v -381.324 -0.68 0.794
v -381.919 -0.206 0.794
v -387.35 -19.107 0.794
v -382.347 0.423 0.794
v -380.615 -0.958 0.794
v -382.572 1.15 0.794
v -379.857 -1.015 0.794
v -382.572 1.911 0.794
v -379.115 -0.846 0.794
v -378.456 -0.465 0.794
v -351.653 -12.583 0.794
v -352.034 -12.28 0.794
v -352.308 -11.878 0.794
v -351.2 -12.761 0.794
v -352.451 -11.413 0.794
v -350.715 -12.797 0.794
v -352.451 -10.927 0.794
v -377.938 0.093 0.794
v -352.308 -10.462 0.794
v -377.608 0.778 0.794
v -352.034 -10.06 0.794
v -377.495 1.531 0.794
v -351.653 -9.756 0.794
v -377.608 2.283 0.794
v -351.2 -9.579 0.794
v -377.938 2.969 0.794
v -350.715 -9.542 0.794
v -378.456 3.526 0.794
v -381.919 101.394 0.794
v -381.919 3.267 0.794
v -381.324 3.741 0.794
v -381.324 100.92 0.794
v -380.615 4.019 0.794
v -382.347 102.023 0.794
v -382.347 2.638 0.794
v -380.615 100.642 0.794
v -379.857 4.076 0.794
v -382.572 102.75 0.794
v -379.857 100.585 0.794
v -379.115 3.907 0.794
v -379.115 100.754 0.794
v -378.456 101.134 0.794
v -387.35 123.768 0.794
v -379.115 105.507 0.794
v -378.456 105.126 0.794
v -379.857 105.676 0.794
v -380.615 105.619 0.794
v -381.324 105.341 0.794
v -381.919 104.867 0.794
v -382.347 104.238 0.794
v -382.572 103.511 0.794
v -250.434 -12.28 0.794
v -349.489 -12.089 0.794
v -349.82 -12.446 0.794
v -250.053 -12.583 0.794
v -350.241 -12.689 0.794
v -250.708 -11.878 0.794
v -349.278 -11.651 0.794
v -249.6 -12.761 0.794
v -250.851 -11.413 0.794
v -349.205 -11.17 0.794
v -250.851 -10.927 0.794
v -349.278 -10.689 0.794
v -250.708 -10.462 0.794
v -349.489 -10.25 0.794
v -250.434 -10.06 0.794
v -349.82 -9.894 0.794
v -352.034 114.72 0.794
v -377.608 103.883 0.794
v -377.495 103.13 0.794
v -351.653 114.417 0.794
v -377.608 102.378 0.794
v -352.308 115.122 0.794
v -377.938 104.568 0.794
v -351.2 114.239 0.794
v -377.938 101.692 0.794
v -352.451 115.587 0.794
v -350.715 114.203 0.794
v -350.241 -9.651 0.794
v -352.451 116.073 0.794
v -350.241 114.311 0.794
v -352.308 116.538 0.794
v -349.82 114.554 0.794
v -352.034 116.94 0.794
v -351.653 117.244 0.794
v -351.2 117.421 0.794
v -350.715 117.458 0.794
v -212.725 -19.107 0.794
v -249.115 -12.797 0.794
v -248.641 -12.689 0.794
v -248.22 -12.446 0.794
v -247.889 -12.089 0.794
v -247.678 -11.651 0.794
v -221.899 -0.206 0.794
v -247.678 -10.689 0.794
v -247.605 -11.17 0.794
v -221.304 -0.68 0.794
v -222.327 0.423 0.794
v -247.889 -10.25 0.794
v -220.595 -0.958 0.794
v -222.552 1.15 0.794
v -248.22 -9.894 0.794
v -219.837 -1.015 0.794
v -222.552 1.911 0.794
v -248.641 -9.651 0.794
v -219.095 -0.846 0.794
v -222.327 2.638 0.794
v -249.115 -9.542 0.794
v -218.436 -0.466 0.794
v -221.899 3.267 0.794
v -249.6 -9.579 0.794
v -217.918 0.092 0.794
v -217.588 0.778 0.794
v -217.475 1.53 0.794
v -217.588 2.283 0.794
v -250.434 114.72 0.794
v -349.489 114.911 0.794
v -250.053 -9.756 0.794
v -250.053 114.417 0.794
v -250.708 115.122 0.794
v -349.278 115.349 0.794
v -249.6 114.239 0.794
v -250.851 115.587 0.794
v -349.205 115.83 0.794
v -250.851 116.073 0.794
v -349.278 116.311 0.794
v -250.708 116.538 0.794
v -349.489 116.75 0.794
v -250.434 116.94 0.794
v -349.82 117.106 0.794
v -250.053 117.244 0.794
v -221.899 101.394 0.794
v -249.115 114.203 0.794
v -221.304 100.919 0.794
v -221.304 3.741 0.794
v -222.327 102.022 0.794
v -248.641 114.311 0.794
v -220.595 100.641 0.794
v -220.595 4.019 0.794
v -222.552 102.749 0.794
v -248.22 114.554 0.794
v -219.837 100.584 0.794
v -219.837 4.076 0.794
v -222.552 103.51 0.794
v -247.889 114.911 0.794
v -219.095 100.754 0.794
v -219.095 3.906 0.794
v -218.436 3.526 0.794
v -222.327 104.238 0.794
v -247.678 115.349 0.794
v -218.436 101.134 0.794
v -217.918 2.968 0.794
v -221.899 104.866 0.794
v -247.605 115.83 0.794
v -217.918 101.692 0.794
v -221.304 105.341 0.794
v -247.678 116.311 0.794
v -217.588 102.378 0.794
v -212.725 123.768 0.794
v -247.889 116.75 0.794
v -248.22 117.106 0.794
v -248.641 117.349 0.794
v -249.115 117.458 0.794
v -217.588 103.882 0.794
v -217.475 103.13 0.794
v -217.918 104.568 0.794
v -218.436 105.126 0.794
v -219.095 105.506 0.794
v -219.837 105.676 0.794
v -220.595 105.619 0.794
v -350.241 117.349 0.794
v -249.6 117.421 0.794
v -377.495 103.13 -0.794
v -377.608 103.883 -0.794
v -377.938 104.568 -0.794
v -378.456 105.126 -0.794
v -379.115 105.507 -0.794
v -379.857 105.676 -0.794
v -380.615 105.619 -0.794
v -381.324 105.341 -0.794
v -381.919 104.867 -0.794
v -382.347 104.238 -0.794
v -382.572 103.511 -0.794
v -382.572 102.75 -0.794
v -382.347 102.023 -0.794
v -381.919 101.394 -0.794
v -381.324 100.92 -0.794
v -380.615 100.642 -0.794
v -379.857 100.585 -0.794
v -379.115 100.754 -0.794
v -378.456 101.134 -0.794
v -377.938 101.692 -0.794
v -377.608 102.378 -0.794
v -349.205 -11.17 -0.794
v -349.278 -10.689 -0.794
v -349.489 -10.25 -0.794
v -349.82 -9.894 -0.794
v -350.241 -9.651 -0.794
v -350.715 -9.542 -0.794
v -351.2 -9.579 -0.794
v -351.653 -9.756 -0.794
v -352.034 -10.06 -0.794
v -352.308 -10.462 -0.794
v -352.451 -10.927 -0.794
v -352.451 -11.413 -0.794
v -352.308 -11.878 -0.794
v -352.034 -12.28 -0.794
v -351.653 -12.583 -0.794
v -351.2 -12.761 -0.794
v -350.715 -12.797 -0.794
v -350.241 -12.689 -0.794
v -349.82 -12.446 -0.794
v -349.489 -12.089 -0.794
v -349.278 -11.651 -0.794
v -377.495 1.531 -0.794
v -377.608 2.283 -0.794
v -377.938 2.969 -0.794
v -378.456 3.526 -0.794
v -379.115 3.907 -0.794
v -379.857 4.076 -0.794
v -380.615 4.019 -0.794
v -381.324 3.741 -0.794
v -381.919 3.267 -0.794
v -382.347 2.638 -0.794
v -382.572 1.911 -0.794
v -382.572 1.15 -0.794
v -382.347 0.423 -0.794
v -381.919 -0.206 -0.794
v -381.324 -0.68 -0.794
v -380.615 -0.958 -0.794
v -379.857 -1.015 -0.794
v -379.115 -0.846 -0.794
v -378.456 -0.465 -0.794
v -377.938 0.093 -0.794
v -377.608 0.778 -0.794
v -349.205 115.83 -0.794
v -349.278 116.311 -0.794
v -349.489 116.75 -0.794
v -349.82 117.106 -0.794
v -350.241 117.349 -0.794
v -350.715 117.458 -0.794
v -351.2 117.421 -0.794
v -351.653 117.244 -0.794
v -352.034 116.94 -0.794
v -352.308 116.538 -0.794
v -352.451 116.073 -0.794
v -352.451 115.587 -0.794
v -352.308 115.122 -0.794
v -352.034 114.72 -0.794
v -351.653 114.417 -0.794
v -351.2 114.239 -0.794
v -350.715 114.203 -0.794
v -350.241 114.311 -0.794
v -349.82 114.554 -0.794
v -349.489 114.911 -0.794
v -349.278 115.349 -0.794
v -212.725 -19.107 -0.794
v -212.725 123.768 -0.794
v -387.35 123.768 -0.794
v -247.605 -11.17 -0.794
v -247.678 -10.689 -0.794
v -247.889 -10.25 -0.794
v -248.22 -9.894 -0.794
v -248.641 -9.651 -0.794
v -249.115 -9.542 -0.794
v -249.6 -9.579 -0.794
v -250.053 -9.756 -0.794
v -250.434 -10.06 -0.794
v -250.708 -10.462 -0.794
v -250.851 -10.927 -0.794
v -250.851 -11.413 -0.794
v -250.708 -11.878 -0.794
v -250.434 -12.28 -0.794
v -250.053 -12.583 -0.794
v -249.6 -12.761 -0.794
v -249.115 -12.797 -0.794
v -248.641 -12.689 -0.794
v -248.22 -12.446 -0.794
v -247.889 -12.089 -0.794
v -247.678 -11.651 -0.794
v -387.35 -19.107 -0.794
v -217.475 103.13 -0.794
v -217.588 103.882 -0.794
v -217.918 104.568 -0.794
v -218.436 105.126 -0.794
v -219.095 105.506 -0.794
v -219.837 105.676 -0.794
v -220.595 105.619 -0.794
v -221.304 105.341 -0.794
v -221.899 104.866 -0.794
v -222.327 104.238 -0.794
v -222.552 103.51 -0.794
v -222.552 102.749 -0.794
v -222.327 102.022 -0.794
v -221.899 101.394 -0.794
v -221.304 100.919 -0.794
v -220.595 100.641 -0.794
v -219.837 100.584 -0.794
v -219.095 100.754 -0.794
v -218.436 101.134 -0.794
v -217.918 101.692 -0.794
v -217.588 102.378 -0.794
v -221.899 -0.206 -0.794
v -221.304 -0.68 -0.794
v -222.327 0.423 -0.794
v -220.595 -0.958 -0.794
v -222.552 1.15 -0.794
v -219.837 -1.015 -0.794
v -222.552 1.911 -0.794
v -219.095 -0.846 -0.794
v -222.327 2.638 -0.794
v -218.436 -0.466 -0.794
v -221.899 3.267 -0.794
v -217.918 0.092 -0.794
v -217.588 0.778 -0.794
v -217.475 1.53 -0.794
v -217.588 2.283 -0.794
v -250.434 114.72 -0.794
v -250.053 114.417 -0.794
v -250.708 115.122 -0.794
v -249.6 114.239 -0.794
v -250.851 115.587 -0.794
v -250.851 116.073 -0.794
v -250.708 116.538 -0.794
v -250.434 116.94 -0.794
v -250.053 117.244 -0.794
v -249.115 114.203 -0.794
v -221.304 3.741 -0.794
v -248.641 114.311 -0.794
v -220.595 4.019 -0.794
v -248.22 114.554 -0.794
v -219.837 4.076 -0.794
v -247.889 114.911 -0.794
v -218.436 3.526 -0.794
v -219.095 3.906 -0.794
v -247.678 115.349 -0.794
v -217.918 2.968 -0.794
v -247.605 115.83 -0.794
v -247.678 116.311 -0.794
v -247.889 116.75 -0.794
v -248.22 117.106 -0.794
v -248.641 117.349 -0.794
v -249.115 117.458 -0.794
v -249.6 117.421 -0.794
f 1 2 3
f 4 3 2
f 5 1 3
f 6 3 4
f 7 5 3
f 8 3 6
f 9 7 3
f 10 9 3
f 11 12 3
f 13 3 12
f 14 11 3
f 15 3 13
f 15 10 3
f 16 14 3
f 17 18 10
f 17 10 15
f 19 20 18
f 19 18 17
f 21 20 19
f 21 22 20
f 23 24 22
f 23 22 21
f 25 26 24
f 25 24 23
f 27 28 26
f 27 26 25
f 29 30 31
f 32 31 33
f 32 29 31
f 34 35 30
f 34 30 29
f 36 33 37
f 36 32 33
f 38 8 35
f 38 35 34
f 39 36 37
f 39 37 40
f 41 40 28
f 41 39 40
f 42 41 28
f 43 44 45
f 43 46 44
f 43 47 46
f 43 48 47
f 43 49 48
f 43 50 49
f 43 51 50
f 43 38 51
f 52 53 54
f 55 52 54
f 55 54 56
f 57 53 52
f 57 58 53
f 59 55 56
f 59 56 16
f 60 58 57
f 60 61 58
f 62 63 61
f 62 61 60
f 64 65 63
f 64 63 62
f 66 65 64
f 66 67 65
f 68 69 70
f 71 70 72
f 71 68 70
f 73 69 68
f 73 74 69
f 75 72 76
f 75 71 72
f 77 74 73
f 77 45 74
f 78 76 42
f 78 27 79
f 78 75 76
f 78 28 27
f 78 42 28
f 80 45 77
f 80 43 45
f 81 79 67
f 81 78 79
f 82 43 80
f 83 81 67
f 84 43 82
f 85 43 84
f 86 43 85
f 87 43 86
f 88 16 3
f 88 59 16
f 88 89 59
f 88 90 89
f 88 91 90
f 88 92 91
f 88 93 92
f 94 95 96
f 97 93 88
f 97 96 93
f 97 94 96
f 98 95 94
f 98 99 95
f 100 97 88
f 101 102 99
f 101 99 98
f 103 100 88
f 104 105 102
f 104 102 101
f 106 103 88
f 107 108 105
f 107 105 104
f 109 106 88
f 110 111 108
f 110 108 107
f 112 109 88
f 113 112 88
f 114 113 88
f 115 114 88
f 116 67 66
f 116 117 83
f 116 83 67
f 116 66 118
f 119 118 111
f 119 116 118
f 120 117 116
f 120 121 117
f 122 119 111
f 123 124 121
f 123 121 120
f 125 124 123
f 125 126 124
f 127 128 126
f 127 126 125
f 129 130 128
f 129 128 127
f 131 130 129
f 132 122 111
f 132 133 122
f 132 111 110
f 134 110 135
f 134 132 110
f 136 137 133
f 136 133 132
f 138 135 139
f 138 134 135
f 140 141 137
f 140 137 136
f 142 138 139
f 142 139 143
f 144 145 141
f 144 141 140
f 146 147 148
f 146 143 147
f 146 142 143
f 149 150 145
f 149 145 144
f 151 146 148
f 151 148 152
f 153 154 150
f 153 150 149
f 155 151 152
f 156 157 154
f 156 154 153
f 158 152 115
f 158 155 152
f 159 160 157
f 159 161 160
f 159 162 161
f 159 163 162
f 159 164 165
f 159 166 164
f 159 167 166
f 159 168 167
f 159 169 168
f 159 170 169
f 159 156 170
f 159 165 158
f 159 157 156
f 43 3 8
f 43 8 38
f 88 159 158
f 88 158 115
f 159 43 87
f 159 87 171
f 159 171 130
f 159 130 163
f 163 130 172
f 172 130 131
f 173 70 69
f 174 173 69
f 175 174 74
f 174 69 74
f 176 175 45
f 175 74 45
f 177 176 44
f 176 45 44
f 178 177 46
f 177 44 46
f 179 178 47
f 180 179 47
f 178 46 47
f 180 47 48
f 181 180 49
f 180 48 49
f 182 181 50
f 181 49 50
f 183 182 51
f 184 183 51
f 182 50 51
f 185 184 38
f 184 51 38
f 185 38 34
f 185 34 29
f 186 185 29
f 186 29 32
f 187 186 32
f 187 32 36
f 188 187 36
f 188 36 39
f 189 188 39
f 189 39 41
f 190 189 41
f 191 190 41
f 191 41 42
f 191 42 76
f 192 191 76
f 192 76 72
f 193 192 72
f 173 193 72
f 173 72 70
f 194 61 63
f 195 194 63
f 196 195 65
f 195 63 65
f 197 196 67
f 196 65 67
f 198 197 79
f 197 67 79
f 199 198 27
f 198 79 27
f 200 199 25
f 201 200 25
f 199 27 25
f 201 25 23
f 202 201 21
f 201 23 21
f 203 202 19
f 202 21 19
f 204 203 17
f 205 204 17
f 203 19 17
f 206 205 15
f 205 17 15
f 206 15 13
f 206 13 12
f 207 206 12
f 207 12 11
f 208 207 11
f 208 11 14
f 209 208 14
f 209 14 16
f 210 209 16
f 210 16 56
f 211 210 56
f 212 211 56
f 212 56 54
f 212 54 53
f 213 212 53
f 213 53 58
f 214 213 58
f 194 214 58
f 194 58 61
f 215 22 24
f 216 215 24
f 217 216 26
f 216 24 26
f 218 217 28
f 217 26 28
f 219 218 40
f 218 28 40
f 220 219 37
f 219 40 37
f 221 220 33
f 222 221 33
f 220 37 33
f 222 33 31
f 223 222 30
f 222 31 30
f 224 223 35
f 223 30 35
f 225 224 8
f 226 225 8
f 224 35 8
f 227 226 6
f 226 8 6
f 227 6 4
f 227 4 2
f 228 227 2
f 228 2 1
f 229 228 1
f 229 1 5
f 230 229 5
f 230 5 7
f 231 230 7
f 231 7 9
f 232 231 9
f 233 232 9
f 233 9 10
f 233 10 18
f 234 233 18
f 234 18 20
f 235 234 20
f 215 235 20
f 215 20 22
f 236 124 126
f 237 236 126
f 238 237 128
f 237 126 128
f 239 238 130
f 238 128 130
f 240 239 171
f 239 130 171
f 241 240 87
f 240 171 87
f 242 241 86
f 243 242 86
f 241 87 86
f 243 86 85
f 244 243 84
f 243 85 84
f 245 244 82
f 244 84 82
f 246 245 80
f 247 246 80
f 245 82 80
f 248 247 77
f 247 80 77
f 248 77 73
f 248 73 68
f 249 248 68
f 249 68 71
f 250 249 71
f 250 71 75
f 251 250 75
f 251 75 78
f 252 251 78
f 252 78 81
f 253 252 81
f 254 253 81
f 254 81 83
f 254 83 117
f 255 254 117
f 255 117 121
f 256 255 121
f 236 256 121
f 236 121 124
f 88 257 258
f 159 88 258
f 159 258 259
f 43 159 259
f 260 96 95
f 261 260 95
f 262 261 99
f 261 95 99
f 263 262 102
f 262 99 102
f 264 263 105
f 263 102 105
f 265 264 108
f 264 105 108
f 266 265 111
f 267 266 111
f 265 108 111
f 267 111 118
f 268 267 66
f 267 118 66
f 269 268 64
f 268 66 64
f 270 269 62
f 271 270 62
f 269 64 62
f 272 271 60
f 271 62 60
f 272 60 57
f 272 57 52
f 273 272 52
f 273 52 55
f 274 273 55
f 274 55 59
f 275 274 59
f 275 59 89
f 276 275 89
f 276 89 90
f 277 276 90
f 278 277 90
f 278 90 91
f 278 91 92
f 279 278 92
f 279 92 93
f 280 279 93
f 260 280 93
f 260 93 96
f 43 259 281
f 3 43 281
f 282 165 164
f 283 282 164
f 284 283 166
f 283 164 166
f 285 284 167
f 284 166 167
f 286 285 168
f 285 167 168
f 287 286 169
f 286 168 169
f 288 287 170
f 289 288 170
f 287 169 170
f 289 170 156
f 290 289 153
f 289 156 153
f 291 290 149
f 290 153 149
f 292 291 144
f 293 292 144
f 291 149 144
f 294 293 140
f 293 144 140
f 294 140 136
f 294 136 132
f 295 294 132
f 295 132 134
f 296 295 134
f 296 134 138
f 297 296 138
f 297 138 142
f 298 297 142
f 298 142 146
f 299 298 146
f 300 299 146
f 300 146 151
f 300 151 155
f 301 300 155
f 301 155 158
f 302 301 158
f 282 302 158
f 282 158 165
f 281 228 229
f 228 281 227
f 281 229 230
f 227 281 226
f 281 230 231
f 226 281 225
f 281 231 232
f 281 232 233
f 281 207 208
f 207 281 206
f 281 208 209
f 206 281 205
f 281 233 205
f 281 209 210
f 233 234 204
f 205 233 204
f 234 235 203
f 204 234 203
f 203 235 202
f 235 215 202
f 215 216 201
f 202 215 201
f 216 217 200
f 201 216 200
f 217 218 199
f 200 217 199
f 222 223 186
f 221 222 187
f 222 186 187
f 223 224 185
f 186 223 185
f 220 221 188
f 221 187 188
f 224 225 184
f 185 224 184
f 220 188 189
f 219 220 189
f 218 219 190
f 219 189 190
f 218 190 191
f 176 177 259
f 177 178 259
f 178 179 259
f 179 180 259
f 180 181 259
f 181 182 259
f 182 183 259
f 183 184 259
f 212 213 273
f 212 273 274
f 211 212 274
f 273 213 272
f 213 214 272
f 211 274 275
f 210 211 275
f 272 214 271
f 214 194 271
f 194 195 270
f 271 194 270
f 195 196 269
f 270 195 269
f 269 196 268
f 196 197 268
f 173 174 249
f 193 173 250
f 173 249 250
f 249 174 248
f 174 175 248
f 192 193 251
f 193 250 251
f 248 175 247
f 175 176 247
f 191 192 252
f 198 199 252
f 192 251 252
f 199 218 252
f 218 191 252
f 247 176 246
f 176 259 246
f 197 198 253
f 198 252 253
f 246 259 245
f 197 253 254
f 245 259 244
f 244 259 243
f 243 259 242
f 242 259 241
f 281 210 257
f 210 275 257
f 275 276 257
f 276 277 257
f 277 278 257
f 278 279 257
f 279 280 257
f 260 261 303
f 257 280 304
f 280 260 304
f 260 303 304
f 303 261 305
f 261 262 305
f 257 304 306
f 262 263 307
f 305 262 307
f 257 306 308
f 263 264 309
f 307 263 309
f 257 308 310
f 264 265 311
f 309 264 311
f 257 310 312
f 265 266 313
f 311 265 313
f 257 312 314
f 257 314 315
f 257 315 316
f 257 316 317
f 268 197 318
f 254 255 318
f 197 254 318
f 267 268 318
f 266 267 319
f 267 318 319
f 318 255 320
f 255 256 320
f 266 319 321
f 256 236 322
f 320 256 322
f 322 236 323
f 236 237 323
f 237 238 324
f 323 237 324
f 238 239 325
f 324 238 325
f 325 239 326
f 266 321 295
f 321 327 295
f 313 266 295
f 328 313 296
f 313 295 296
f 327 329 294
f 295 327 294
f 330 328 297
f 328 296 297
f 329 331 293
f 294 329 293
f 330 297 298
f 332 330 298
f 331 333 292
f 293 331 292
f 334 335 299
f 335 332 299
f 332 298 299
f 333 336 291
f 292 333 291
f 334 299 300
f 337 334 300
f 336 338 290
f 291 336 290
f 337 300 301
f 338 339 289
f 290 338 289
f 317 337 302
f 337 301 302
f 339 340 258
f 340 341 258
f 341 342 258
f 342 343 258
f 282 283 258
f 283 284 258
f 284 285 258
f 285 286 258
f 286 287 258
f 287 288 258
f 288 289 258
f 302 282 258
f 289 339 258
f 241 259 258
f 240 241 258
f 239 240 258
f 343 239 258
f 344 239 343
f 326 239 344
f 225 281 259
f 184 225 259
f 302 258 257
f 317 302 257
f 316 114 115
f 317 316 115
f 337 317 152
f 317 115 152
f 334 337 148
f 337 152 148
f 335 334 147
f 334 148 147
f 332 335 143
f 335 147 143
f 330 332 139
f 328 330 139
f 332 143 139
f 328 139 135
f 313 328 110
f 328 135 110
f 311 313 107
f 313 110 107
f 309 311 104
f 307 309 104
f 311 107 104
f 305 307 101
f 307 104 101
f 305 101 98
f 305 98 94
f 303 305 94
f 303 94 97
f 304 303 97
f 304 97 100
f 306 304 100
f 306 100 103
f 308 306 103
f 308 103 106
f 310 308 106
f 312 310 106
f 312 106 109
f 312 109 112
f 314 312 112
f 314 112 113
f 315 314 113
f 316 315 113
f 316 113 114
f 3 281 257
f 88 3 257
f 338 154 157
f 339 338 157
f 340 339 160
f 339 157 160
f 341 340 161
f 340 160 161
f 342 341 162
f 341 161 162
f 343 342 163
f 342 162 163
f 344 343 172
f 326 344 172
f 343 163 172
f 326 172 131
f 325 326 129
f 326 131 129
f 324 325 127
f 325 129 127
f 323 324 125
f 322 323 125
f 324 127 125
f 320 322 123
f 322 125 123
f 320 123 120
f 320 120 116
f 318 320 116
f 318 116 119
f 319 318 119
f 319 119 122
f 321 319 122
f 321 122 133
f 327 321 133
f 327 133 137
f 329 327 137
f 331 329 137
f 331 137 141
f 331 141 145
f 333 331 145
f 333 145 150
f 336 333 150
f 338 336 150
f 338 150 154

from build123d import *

# Parameters (mm, degrees)
SKETCH3_W              = 914.4
SKETCH3_H              = 609.6
BOSS_EXTRUDE1_DEPTH    = 0.79375
SKETCH4_OUTSIDE_W      = 1136.194
SKETCH4_OUTSIDE_H      = 831.394
CUT_EXTRUDE1_DEPTH     = 2.54
F_4_CLEARANCE_HOLE1_D  = 3.2639
F_10_CLEARANCE_HOLE1_D = 5.1054


with BuildPart() as part:
    # Sketch3 → Boss-Extrude1 (new, symmetric)
    with BuildSketch(Plane.XY):
        Rectangle(SKETCH3_W, SKETCH3_H)
    extrude(amount=BOSS_EXTRUDE1_DEPTH, both=True)

    # Sketch4 outside → Cut-Extrude1 (cut)
    with BuildSketch(Plane(origin=(0, 0, -0.79375), x_dir=(-1, 0, 0), z_dir=(0, 0, -1))):
        Rectangle(SKETCH4_OUTSIDE_W, SKETCH4_OUTSIDE_H)
        Polygon((387.349825772, -19.107241188), (212.724825222, -19.107241187), (212.724825222, 123.767758813), (387.349825755, 123.767758812), align=None, mode=Mode.SUBTRACT)
    extrude(amount=-CUT_EXTRUDE1_DEPTH, mode=Mode.SUBTRACT)

    # #4 Clearance Hole1 (through all)
    with Locations(Plane(origin=(0, 0, -0.79375), x_dir=(-1, 0, 0), z_dir=(0, 0, -1))):
        with Locations((350.837325504, 115.830258819), (249.237325504, 115.830258806), (249.23732552, -11.169741194), (350.83732552, -11.169741181)):
            Hole(F_4_CLEARANCE_HOLE1_D / 2)

    # #10 Clearance Hole1 (through all)
    with Locations(Plane(origin=(0, 0, -0.79375), x_dir=(-1, 0, 0), z_dir=(0, 0, -1))):
        with Locations((220.027325222, 1.530258305), (220.027325222, 103.129958819), (380.047325758, 103.130259319), (380.04732577, 1.530558805)):
            Hole(F_10_CLEARANCE_HOLE1_D / 2)


solid = part.part
